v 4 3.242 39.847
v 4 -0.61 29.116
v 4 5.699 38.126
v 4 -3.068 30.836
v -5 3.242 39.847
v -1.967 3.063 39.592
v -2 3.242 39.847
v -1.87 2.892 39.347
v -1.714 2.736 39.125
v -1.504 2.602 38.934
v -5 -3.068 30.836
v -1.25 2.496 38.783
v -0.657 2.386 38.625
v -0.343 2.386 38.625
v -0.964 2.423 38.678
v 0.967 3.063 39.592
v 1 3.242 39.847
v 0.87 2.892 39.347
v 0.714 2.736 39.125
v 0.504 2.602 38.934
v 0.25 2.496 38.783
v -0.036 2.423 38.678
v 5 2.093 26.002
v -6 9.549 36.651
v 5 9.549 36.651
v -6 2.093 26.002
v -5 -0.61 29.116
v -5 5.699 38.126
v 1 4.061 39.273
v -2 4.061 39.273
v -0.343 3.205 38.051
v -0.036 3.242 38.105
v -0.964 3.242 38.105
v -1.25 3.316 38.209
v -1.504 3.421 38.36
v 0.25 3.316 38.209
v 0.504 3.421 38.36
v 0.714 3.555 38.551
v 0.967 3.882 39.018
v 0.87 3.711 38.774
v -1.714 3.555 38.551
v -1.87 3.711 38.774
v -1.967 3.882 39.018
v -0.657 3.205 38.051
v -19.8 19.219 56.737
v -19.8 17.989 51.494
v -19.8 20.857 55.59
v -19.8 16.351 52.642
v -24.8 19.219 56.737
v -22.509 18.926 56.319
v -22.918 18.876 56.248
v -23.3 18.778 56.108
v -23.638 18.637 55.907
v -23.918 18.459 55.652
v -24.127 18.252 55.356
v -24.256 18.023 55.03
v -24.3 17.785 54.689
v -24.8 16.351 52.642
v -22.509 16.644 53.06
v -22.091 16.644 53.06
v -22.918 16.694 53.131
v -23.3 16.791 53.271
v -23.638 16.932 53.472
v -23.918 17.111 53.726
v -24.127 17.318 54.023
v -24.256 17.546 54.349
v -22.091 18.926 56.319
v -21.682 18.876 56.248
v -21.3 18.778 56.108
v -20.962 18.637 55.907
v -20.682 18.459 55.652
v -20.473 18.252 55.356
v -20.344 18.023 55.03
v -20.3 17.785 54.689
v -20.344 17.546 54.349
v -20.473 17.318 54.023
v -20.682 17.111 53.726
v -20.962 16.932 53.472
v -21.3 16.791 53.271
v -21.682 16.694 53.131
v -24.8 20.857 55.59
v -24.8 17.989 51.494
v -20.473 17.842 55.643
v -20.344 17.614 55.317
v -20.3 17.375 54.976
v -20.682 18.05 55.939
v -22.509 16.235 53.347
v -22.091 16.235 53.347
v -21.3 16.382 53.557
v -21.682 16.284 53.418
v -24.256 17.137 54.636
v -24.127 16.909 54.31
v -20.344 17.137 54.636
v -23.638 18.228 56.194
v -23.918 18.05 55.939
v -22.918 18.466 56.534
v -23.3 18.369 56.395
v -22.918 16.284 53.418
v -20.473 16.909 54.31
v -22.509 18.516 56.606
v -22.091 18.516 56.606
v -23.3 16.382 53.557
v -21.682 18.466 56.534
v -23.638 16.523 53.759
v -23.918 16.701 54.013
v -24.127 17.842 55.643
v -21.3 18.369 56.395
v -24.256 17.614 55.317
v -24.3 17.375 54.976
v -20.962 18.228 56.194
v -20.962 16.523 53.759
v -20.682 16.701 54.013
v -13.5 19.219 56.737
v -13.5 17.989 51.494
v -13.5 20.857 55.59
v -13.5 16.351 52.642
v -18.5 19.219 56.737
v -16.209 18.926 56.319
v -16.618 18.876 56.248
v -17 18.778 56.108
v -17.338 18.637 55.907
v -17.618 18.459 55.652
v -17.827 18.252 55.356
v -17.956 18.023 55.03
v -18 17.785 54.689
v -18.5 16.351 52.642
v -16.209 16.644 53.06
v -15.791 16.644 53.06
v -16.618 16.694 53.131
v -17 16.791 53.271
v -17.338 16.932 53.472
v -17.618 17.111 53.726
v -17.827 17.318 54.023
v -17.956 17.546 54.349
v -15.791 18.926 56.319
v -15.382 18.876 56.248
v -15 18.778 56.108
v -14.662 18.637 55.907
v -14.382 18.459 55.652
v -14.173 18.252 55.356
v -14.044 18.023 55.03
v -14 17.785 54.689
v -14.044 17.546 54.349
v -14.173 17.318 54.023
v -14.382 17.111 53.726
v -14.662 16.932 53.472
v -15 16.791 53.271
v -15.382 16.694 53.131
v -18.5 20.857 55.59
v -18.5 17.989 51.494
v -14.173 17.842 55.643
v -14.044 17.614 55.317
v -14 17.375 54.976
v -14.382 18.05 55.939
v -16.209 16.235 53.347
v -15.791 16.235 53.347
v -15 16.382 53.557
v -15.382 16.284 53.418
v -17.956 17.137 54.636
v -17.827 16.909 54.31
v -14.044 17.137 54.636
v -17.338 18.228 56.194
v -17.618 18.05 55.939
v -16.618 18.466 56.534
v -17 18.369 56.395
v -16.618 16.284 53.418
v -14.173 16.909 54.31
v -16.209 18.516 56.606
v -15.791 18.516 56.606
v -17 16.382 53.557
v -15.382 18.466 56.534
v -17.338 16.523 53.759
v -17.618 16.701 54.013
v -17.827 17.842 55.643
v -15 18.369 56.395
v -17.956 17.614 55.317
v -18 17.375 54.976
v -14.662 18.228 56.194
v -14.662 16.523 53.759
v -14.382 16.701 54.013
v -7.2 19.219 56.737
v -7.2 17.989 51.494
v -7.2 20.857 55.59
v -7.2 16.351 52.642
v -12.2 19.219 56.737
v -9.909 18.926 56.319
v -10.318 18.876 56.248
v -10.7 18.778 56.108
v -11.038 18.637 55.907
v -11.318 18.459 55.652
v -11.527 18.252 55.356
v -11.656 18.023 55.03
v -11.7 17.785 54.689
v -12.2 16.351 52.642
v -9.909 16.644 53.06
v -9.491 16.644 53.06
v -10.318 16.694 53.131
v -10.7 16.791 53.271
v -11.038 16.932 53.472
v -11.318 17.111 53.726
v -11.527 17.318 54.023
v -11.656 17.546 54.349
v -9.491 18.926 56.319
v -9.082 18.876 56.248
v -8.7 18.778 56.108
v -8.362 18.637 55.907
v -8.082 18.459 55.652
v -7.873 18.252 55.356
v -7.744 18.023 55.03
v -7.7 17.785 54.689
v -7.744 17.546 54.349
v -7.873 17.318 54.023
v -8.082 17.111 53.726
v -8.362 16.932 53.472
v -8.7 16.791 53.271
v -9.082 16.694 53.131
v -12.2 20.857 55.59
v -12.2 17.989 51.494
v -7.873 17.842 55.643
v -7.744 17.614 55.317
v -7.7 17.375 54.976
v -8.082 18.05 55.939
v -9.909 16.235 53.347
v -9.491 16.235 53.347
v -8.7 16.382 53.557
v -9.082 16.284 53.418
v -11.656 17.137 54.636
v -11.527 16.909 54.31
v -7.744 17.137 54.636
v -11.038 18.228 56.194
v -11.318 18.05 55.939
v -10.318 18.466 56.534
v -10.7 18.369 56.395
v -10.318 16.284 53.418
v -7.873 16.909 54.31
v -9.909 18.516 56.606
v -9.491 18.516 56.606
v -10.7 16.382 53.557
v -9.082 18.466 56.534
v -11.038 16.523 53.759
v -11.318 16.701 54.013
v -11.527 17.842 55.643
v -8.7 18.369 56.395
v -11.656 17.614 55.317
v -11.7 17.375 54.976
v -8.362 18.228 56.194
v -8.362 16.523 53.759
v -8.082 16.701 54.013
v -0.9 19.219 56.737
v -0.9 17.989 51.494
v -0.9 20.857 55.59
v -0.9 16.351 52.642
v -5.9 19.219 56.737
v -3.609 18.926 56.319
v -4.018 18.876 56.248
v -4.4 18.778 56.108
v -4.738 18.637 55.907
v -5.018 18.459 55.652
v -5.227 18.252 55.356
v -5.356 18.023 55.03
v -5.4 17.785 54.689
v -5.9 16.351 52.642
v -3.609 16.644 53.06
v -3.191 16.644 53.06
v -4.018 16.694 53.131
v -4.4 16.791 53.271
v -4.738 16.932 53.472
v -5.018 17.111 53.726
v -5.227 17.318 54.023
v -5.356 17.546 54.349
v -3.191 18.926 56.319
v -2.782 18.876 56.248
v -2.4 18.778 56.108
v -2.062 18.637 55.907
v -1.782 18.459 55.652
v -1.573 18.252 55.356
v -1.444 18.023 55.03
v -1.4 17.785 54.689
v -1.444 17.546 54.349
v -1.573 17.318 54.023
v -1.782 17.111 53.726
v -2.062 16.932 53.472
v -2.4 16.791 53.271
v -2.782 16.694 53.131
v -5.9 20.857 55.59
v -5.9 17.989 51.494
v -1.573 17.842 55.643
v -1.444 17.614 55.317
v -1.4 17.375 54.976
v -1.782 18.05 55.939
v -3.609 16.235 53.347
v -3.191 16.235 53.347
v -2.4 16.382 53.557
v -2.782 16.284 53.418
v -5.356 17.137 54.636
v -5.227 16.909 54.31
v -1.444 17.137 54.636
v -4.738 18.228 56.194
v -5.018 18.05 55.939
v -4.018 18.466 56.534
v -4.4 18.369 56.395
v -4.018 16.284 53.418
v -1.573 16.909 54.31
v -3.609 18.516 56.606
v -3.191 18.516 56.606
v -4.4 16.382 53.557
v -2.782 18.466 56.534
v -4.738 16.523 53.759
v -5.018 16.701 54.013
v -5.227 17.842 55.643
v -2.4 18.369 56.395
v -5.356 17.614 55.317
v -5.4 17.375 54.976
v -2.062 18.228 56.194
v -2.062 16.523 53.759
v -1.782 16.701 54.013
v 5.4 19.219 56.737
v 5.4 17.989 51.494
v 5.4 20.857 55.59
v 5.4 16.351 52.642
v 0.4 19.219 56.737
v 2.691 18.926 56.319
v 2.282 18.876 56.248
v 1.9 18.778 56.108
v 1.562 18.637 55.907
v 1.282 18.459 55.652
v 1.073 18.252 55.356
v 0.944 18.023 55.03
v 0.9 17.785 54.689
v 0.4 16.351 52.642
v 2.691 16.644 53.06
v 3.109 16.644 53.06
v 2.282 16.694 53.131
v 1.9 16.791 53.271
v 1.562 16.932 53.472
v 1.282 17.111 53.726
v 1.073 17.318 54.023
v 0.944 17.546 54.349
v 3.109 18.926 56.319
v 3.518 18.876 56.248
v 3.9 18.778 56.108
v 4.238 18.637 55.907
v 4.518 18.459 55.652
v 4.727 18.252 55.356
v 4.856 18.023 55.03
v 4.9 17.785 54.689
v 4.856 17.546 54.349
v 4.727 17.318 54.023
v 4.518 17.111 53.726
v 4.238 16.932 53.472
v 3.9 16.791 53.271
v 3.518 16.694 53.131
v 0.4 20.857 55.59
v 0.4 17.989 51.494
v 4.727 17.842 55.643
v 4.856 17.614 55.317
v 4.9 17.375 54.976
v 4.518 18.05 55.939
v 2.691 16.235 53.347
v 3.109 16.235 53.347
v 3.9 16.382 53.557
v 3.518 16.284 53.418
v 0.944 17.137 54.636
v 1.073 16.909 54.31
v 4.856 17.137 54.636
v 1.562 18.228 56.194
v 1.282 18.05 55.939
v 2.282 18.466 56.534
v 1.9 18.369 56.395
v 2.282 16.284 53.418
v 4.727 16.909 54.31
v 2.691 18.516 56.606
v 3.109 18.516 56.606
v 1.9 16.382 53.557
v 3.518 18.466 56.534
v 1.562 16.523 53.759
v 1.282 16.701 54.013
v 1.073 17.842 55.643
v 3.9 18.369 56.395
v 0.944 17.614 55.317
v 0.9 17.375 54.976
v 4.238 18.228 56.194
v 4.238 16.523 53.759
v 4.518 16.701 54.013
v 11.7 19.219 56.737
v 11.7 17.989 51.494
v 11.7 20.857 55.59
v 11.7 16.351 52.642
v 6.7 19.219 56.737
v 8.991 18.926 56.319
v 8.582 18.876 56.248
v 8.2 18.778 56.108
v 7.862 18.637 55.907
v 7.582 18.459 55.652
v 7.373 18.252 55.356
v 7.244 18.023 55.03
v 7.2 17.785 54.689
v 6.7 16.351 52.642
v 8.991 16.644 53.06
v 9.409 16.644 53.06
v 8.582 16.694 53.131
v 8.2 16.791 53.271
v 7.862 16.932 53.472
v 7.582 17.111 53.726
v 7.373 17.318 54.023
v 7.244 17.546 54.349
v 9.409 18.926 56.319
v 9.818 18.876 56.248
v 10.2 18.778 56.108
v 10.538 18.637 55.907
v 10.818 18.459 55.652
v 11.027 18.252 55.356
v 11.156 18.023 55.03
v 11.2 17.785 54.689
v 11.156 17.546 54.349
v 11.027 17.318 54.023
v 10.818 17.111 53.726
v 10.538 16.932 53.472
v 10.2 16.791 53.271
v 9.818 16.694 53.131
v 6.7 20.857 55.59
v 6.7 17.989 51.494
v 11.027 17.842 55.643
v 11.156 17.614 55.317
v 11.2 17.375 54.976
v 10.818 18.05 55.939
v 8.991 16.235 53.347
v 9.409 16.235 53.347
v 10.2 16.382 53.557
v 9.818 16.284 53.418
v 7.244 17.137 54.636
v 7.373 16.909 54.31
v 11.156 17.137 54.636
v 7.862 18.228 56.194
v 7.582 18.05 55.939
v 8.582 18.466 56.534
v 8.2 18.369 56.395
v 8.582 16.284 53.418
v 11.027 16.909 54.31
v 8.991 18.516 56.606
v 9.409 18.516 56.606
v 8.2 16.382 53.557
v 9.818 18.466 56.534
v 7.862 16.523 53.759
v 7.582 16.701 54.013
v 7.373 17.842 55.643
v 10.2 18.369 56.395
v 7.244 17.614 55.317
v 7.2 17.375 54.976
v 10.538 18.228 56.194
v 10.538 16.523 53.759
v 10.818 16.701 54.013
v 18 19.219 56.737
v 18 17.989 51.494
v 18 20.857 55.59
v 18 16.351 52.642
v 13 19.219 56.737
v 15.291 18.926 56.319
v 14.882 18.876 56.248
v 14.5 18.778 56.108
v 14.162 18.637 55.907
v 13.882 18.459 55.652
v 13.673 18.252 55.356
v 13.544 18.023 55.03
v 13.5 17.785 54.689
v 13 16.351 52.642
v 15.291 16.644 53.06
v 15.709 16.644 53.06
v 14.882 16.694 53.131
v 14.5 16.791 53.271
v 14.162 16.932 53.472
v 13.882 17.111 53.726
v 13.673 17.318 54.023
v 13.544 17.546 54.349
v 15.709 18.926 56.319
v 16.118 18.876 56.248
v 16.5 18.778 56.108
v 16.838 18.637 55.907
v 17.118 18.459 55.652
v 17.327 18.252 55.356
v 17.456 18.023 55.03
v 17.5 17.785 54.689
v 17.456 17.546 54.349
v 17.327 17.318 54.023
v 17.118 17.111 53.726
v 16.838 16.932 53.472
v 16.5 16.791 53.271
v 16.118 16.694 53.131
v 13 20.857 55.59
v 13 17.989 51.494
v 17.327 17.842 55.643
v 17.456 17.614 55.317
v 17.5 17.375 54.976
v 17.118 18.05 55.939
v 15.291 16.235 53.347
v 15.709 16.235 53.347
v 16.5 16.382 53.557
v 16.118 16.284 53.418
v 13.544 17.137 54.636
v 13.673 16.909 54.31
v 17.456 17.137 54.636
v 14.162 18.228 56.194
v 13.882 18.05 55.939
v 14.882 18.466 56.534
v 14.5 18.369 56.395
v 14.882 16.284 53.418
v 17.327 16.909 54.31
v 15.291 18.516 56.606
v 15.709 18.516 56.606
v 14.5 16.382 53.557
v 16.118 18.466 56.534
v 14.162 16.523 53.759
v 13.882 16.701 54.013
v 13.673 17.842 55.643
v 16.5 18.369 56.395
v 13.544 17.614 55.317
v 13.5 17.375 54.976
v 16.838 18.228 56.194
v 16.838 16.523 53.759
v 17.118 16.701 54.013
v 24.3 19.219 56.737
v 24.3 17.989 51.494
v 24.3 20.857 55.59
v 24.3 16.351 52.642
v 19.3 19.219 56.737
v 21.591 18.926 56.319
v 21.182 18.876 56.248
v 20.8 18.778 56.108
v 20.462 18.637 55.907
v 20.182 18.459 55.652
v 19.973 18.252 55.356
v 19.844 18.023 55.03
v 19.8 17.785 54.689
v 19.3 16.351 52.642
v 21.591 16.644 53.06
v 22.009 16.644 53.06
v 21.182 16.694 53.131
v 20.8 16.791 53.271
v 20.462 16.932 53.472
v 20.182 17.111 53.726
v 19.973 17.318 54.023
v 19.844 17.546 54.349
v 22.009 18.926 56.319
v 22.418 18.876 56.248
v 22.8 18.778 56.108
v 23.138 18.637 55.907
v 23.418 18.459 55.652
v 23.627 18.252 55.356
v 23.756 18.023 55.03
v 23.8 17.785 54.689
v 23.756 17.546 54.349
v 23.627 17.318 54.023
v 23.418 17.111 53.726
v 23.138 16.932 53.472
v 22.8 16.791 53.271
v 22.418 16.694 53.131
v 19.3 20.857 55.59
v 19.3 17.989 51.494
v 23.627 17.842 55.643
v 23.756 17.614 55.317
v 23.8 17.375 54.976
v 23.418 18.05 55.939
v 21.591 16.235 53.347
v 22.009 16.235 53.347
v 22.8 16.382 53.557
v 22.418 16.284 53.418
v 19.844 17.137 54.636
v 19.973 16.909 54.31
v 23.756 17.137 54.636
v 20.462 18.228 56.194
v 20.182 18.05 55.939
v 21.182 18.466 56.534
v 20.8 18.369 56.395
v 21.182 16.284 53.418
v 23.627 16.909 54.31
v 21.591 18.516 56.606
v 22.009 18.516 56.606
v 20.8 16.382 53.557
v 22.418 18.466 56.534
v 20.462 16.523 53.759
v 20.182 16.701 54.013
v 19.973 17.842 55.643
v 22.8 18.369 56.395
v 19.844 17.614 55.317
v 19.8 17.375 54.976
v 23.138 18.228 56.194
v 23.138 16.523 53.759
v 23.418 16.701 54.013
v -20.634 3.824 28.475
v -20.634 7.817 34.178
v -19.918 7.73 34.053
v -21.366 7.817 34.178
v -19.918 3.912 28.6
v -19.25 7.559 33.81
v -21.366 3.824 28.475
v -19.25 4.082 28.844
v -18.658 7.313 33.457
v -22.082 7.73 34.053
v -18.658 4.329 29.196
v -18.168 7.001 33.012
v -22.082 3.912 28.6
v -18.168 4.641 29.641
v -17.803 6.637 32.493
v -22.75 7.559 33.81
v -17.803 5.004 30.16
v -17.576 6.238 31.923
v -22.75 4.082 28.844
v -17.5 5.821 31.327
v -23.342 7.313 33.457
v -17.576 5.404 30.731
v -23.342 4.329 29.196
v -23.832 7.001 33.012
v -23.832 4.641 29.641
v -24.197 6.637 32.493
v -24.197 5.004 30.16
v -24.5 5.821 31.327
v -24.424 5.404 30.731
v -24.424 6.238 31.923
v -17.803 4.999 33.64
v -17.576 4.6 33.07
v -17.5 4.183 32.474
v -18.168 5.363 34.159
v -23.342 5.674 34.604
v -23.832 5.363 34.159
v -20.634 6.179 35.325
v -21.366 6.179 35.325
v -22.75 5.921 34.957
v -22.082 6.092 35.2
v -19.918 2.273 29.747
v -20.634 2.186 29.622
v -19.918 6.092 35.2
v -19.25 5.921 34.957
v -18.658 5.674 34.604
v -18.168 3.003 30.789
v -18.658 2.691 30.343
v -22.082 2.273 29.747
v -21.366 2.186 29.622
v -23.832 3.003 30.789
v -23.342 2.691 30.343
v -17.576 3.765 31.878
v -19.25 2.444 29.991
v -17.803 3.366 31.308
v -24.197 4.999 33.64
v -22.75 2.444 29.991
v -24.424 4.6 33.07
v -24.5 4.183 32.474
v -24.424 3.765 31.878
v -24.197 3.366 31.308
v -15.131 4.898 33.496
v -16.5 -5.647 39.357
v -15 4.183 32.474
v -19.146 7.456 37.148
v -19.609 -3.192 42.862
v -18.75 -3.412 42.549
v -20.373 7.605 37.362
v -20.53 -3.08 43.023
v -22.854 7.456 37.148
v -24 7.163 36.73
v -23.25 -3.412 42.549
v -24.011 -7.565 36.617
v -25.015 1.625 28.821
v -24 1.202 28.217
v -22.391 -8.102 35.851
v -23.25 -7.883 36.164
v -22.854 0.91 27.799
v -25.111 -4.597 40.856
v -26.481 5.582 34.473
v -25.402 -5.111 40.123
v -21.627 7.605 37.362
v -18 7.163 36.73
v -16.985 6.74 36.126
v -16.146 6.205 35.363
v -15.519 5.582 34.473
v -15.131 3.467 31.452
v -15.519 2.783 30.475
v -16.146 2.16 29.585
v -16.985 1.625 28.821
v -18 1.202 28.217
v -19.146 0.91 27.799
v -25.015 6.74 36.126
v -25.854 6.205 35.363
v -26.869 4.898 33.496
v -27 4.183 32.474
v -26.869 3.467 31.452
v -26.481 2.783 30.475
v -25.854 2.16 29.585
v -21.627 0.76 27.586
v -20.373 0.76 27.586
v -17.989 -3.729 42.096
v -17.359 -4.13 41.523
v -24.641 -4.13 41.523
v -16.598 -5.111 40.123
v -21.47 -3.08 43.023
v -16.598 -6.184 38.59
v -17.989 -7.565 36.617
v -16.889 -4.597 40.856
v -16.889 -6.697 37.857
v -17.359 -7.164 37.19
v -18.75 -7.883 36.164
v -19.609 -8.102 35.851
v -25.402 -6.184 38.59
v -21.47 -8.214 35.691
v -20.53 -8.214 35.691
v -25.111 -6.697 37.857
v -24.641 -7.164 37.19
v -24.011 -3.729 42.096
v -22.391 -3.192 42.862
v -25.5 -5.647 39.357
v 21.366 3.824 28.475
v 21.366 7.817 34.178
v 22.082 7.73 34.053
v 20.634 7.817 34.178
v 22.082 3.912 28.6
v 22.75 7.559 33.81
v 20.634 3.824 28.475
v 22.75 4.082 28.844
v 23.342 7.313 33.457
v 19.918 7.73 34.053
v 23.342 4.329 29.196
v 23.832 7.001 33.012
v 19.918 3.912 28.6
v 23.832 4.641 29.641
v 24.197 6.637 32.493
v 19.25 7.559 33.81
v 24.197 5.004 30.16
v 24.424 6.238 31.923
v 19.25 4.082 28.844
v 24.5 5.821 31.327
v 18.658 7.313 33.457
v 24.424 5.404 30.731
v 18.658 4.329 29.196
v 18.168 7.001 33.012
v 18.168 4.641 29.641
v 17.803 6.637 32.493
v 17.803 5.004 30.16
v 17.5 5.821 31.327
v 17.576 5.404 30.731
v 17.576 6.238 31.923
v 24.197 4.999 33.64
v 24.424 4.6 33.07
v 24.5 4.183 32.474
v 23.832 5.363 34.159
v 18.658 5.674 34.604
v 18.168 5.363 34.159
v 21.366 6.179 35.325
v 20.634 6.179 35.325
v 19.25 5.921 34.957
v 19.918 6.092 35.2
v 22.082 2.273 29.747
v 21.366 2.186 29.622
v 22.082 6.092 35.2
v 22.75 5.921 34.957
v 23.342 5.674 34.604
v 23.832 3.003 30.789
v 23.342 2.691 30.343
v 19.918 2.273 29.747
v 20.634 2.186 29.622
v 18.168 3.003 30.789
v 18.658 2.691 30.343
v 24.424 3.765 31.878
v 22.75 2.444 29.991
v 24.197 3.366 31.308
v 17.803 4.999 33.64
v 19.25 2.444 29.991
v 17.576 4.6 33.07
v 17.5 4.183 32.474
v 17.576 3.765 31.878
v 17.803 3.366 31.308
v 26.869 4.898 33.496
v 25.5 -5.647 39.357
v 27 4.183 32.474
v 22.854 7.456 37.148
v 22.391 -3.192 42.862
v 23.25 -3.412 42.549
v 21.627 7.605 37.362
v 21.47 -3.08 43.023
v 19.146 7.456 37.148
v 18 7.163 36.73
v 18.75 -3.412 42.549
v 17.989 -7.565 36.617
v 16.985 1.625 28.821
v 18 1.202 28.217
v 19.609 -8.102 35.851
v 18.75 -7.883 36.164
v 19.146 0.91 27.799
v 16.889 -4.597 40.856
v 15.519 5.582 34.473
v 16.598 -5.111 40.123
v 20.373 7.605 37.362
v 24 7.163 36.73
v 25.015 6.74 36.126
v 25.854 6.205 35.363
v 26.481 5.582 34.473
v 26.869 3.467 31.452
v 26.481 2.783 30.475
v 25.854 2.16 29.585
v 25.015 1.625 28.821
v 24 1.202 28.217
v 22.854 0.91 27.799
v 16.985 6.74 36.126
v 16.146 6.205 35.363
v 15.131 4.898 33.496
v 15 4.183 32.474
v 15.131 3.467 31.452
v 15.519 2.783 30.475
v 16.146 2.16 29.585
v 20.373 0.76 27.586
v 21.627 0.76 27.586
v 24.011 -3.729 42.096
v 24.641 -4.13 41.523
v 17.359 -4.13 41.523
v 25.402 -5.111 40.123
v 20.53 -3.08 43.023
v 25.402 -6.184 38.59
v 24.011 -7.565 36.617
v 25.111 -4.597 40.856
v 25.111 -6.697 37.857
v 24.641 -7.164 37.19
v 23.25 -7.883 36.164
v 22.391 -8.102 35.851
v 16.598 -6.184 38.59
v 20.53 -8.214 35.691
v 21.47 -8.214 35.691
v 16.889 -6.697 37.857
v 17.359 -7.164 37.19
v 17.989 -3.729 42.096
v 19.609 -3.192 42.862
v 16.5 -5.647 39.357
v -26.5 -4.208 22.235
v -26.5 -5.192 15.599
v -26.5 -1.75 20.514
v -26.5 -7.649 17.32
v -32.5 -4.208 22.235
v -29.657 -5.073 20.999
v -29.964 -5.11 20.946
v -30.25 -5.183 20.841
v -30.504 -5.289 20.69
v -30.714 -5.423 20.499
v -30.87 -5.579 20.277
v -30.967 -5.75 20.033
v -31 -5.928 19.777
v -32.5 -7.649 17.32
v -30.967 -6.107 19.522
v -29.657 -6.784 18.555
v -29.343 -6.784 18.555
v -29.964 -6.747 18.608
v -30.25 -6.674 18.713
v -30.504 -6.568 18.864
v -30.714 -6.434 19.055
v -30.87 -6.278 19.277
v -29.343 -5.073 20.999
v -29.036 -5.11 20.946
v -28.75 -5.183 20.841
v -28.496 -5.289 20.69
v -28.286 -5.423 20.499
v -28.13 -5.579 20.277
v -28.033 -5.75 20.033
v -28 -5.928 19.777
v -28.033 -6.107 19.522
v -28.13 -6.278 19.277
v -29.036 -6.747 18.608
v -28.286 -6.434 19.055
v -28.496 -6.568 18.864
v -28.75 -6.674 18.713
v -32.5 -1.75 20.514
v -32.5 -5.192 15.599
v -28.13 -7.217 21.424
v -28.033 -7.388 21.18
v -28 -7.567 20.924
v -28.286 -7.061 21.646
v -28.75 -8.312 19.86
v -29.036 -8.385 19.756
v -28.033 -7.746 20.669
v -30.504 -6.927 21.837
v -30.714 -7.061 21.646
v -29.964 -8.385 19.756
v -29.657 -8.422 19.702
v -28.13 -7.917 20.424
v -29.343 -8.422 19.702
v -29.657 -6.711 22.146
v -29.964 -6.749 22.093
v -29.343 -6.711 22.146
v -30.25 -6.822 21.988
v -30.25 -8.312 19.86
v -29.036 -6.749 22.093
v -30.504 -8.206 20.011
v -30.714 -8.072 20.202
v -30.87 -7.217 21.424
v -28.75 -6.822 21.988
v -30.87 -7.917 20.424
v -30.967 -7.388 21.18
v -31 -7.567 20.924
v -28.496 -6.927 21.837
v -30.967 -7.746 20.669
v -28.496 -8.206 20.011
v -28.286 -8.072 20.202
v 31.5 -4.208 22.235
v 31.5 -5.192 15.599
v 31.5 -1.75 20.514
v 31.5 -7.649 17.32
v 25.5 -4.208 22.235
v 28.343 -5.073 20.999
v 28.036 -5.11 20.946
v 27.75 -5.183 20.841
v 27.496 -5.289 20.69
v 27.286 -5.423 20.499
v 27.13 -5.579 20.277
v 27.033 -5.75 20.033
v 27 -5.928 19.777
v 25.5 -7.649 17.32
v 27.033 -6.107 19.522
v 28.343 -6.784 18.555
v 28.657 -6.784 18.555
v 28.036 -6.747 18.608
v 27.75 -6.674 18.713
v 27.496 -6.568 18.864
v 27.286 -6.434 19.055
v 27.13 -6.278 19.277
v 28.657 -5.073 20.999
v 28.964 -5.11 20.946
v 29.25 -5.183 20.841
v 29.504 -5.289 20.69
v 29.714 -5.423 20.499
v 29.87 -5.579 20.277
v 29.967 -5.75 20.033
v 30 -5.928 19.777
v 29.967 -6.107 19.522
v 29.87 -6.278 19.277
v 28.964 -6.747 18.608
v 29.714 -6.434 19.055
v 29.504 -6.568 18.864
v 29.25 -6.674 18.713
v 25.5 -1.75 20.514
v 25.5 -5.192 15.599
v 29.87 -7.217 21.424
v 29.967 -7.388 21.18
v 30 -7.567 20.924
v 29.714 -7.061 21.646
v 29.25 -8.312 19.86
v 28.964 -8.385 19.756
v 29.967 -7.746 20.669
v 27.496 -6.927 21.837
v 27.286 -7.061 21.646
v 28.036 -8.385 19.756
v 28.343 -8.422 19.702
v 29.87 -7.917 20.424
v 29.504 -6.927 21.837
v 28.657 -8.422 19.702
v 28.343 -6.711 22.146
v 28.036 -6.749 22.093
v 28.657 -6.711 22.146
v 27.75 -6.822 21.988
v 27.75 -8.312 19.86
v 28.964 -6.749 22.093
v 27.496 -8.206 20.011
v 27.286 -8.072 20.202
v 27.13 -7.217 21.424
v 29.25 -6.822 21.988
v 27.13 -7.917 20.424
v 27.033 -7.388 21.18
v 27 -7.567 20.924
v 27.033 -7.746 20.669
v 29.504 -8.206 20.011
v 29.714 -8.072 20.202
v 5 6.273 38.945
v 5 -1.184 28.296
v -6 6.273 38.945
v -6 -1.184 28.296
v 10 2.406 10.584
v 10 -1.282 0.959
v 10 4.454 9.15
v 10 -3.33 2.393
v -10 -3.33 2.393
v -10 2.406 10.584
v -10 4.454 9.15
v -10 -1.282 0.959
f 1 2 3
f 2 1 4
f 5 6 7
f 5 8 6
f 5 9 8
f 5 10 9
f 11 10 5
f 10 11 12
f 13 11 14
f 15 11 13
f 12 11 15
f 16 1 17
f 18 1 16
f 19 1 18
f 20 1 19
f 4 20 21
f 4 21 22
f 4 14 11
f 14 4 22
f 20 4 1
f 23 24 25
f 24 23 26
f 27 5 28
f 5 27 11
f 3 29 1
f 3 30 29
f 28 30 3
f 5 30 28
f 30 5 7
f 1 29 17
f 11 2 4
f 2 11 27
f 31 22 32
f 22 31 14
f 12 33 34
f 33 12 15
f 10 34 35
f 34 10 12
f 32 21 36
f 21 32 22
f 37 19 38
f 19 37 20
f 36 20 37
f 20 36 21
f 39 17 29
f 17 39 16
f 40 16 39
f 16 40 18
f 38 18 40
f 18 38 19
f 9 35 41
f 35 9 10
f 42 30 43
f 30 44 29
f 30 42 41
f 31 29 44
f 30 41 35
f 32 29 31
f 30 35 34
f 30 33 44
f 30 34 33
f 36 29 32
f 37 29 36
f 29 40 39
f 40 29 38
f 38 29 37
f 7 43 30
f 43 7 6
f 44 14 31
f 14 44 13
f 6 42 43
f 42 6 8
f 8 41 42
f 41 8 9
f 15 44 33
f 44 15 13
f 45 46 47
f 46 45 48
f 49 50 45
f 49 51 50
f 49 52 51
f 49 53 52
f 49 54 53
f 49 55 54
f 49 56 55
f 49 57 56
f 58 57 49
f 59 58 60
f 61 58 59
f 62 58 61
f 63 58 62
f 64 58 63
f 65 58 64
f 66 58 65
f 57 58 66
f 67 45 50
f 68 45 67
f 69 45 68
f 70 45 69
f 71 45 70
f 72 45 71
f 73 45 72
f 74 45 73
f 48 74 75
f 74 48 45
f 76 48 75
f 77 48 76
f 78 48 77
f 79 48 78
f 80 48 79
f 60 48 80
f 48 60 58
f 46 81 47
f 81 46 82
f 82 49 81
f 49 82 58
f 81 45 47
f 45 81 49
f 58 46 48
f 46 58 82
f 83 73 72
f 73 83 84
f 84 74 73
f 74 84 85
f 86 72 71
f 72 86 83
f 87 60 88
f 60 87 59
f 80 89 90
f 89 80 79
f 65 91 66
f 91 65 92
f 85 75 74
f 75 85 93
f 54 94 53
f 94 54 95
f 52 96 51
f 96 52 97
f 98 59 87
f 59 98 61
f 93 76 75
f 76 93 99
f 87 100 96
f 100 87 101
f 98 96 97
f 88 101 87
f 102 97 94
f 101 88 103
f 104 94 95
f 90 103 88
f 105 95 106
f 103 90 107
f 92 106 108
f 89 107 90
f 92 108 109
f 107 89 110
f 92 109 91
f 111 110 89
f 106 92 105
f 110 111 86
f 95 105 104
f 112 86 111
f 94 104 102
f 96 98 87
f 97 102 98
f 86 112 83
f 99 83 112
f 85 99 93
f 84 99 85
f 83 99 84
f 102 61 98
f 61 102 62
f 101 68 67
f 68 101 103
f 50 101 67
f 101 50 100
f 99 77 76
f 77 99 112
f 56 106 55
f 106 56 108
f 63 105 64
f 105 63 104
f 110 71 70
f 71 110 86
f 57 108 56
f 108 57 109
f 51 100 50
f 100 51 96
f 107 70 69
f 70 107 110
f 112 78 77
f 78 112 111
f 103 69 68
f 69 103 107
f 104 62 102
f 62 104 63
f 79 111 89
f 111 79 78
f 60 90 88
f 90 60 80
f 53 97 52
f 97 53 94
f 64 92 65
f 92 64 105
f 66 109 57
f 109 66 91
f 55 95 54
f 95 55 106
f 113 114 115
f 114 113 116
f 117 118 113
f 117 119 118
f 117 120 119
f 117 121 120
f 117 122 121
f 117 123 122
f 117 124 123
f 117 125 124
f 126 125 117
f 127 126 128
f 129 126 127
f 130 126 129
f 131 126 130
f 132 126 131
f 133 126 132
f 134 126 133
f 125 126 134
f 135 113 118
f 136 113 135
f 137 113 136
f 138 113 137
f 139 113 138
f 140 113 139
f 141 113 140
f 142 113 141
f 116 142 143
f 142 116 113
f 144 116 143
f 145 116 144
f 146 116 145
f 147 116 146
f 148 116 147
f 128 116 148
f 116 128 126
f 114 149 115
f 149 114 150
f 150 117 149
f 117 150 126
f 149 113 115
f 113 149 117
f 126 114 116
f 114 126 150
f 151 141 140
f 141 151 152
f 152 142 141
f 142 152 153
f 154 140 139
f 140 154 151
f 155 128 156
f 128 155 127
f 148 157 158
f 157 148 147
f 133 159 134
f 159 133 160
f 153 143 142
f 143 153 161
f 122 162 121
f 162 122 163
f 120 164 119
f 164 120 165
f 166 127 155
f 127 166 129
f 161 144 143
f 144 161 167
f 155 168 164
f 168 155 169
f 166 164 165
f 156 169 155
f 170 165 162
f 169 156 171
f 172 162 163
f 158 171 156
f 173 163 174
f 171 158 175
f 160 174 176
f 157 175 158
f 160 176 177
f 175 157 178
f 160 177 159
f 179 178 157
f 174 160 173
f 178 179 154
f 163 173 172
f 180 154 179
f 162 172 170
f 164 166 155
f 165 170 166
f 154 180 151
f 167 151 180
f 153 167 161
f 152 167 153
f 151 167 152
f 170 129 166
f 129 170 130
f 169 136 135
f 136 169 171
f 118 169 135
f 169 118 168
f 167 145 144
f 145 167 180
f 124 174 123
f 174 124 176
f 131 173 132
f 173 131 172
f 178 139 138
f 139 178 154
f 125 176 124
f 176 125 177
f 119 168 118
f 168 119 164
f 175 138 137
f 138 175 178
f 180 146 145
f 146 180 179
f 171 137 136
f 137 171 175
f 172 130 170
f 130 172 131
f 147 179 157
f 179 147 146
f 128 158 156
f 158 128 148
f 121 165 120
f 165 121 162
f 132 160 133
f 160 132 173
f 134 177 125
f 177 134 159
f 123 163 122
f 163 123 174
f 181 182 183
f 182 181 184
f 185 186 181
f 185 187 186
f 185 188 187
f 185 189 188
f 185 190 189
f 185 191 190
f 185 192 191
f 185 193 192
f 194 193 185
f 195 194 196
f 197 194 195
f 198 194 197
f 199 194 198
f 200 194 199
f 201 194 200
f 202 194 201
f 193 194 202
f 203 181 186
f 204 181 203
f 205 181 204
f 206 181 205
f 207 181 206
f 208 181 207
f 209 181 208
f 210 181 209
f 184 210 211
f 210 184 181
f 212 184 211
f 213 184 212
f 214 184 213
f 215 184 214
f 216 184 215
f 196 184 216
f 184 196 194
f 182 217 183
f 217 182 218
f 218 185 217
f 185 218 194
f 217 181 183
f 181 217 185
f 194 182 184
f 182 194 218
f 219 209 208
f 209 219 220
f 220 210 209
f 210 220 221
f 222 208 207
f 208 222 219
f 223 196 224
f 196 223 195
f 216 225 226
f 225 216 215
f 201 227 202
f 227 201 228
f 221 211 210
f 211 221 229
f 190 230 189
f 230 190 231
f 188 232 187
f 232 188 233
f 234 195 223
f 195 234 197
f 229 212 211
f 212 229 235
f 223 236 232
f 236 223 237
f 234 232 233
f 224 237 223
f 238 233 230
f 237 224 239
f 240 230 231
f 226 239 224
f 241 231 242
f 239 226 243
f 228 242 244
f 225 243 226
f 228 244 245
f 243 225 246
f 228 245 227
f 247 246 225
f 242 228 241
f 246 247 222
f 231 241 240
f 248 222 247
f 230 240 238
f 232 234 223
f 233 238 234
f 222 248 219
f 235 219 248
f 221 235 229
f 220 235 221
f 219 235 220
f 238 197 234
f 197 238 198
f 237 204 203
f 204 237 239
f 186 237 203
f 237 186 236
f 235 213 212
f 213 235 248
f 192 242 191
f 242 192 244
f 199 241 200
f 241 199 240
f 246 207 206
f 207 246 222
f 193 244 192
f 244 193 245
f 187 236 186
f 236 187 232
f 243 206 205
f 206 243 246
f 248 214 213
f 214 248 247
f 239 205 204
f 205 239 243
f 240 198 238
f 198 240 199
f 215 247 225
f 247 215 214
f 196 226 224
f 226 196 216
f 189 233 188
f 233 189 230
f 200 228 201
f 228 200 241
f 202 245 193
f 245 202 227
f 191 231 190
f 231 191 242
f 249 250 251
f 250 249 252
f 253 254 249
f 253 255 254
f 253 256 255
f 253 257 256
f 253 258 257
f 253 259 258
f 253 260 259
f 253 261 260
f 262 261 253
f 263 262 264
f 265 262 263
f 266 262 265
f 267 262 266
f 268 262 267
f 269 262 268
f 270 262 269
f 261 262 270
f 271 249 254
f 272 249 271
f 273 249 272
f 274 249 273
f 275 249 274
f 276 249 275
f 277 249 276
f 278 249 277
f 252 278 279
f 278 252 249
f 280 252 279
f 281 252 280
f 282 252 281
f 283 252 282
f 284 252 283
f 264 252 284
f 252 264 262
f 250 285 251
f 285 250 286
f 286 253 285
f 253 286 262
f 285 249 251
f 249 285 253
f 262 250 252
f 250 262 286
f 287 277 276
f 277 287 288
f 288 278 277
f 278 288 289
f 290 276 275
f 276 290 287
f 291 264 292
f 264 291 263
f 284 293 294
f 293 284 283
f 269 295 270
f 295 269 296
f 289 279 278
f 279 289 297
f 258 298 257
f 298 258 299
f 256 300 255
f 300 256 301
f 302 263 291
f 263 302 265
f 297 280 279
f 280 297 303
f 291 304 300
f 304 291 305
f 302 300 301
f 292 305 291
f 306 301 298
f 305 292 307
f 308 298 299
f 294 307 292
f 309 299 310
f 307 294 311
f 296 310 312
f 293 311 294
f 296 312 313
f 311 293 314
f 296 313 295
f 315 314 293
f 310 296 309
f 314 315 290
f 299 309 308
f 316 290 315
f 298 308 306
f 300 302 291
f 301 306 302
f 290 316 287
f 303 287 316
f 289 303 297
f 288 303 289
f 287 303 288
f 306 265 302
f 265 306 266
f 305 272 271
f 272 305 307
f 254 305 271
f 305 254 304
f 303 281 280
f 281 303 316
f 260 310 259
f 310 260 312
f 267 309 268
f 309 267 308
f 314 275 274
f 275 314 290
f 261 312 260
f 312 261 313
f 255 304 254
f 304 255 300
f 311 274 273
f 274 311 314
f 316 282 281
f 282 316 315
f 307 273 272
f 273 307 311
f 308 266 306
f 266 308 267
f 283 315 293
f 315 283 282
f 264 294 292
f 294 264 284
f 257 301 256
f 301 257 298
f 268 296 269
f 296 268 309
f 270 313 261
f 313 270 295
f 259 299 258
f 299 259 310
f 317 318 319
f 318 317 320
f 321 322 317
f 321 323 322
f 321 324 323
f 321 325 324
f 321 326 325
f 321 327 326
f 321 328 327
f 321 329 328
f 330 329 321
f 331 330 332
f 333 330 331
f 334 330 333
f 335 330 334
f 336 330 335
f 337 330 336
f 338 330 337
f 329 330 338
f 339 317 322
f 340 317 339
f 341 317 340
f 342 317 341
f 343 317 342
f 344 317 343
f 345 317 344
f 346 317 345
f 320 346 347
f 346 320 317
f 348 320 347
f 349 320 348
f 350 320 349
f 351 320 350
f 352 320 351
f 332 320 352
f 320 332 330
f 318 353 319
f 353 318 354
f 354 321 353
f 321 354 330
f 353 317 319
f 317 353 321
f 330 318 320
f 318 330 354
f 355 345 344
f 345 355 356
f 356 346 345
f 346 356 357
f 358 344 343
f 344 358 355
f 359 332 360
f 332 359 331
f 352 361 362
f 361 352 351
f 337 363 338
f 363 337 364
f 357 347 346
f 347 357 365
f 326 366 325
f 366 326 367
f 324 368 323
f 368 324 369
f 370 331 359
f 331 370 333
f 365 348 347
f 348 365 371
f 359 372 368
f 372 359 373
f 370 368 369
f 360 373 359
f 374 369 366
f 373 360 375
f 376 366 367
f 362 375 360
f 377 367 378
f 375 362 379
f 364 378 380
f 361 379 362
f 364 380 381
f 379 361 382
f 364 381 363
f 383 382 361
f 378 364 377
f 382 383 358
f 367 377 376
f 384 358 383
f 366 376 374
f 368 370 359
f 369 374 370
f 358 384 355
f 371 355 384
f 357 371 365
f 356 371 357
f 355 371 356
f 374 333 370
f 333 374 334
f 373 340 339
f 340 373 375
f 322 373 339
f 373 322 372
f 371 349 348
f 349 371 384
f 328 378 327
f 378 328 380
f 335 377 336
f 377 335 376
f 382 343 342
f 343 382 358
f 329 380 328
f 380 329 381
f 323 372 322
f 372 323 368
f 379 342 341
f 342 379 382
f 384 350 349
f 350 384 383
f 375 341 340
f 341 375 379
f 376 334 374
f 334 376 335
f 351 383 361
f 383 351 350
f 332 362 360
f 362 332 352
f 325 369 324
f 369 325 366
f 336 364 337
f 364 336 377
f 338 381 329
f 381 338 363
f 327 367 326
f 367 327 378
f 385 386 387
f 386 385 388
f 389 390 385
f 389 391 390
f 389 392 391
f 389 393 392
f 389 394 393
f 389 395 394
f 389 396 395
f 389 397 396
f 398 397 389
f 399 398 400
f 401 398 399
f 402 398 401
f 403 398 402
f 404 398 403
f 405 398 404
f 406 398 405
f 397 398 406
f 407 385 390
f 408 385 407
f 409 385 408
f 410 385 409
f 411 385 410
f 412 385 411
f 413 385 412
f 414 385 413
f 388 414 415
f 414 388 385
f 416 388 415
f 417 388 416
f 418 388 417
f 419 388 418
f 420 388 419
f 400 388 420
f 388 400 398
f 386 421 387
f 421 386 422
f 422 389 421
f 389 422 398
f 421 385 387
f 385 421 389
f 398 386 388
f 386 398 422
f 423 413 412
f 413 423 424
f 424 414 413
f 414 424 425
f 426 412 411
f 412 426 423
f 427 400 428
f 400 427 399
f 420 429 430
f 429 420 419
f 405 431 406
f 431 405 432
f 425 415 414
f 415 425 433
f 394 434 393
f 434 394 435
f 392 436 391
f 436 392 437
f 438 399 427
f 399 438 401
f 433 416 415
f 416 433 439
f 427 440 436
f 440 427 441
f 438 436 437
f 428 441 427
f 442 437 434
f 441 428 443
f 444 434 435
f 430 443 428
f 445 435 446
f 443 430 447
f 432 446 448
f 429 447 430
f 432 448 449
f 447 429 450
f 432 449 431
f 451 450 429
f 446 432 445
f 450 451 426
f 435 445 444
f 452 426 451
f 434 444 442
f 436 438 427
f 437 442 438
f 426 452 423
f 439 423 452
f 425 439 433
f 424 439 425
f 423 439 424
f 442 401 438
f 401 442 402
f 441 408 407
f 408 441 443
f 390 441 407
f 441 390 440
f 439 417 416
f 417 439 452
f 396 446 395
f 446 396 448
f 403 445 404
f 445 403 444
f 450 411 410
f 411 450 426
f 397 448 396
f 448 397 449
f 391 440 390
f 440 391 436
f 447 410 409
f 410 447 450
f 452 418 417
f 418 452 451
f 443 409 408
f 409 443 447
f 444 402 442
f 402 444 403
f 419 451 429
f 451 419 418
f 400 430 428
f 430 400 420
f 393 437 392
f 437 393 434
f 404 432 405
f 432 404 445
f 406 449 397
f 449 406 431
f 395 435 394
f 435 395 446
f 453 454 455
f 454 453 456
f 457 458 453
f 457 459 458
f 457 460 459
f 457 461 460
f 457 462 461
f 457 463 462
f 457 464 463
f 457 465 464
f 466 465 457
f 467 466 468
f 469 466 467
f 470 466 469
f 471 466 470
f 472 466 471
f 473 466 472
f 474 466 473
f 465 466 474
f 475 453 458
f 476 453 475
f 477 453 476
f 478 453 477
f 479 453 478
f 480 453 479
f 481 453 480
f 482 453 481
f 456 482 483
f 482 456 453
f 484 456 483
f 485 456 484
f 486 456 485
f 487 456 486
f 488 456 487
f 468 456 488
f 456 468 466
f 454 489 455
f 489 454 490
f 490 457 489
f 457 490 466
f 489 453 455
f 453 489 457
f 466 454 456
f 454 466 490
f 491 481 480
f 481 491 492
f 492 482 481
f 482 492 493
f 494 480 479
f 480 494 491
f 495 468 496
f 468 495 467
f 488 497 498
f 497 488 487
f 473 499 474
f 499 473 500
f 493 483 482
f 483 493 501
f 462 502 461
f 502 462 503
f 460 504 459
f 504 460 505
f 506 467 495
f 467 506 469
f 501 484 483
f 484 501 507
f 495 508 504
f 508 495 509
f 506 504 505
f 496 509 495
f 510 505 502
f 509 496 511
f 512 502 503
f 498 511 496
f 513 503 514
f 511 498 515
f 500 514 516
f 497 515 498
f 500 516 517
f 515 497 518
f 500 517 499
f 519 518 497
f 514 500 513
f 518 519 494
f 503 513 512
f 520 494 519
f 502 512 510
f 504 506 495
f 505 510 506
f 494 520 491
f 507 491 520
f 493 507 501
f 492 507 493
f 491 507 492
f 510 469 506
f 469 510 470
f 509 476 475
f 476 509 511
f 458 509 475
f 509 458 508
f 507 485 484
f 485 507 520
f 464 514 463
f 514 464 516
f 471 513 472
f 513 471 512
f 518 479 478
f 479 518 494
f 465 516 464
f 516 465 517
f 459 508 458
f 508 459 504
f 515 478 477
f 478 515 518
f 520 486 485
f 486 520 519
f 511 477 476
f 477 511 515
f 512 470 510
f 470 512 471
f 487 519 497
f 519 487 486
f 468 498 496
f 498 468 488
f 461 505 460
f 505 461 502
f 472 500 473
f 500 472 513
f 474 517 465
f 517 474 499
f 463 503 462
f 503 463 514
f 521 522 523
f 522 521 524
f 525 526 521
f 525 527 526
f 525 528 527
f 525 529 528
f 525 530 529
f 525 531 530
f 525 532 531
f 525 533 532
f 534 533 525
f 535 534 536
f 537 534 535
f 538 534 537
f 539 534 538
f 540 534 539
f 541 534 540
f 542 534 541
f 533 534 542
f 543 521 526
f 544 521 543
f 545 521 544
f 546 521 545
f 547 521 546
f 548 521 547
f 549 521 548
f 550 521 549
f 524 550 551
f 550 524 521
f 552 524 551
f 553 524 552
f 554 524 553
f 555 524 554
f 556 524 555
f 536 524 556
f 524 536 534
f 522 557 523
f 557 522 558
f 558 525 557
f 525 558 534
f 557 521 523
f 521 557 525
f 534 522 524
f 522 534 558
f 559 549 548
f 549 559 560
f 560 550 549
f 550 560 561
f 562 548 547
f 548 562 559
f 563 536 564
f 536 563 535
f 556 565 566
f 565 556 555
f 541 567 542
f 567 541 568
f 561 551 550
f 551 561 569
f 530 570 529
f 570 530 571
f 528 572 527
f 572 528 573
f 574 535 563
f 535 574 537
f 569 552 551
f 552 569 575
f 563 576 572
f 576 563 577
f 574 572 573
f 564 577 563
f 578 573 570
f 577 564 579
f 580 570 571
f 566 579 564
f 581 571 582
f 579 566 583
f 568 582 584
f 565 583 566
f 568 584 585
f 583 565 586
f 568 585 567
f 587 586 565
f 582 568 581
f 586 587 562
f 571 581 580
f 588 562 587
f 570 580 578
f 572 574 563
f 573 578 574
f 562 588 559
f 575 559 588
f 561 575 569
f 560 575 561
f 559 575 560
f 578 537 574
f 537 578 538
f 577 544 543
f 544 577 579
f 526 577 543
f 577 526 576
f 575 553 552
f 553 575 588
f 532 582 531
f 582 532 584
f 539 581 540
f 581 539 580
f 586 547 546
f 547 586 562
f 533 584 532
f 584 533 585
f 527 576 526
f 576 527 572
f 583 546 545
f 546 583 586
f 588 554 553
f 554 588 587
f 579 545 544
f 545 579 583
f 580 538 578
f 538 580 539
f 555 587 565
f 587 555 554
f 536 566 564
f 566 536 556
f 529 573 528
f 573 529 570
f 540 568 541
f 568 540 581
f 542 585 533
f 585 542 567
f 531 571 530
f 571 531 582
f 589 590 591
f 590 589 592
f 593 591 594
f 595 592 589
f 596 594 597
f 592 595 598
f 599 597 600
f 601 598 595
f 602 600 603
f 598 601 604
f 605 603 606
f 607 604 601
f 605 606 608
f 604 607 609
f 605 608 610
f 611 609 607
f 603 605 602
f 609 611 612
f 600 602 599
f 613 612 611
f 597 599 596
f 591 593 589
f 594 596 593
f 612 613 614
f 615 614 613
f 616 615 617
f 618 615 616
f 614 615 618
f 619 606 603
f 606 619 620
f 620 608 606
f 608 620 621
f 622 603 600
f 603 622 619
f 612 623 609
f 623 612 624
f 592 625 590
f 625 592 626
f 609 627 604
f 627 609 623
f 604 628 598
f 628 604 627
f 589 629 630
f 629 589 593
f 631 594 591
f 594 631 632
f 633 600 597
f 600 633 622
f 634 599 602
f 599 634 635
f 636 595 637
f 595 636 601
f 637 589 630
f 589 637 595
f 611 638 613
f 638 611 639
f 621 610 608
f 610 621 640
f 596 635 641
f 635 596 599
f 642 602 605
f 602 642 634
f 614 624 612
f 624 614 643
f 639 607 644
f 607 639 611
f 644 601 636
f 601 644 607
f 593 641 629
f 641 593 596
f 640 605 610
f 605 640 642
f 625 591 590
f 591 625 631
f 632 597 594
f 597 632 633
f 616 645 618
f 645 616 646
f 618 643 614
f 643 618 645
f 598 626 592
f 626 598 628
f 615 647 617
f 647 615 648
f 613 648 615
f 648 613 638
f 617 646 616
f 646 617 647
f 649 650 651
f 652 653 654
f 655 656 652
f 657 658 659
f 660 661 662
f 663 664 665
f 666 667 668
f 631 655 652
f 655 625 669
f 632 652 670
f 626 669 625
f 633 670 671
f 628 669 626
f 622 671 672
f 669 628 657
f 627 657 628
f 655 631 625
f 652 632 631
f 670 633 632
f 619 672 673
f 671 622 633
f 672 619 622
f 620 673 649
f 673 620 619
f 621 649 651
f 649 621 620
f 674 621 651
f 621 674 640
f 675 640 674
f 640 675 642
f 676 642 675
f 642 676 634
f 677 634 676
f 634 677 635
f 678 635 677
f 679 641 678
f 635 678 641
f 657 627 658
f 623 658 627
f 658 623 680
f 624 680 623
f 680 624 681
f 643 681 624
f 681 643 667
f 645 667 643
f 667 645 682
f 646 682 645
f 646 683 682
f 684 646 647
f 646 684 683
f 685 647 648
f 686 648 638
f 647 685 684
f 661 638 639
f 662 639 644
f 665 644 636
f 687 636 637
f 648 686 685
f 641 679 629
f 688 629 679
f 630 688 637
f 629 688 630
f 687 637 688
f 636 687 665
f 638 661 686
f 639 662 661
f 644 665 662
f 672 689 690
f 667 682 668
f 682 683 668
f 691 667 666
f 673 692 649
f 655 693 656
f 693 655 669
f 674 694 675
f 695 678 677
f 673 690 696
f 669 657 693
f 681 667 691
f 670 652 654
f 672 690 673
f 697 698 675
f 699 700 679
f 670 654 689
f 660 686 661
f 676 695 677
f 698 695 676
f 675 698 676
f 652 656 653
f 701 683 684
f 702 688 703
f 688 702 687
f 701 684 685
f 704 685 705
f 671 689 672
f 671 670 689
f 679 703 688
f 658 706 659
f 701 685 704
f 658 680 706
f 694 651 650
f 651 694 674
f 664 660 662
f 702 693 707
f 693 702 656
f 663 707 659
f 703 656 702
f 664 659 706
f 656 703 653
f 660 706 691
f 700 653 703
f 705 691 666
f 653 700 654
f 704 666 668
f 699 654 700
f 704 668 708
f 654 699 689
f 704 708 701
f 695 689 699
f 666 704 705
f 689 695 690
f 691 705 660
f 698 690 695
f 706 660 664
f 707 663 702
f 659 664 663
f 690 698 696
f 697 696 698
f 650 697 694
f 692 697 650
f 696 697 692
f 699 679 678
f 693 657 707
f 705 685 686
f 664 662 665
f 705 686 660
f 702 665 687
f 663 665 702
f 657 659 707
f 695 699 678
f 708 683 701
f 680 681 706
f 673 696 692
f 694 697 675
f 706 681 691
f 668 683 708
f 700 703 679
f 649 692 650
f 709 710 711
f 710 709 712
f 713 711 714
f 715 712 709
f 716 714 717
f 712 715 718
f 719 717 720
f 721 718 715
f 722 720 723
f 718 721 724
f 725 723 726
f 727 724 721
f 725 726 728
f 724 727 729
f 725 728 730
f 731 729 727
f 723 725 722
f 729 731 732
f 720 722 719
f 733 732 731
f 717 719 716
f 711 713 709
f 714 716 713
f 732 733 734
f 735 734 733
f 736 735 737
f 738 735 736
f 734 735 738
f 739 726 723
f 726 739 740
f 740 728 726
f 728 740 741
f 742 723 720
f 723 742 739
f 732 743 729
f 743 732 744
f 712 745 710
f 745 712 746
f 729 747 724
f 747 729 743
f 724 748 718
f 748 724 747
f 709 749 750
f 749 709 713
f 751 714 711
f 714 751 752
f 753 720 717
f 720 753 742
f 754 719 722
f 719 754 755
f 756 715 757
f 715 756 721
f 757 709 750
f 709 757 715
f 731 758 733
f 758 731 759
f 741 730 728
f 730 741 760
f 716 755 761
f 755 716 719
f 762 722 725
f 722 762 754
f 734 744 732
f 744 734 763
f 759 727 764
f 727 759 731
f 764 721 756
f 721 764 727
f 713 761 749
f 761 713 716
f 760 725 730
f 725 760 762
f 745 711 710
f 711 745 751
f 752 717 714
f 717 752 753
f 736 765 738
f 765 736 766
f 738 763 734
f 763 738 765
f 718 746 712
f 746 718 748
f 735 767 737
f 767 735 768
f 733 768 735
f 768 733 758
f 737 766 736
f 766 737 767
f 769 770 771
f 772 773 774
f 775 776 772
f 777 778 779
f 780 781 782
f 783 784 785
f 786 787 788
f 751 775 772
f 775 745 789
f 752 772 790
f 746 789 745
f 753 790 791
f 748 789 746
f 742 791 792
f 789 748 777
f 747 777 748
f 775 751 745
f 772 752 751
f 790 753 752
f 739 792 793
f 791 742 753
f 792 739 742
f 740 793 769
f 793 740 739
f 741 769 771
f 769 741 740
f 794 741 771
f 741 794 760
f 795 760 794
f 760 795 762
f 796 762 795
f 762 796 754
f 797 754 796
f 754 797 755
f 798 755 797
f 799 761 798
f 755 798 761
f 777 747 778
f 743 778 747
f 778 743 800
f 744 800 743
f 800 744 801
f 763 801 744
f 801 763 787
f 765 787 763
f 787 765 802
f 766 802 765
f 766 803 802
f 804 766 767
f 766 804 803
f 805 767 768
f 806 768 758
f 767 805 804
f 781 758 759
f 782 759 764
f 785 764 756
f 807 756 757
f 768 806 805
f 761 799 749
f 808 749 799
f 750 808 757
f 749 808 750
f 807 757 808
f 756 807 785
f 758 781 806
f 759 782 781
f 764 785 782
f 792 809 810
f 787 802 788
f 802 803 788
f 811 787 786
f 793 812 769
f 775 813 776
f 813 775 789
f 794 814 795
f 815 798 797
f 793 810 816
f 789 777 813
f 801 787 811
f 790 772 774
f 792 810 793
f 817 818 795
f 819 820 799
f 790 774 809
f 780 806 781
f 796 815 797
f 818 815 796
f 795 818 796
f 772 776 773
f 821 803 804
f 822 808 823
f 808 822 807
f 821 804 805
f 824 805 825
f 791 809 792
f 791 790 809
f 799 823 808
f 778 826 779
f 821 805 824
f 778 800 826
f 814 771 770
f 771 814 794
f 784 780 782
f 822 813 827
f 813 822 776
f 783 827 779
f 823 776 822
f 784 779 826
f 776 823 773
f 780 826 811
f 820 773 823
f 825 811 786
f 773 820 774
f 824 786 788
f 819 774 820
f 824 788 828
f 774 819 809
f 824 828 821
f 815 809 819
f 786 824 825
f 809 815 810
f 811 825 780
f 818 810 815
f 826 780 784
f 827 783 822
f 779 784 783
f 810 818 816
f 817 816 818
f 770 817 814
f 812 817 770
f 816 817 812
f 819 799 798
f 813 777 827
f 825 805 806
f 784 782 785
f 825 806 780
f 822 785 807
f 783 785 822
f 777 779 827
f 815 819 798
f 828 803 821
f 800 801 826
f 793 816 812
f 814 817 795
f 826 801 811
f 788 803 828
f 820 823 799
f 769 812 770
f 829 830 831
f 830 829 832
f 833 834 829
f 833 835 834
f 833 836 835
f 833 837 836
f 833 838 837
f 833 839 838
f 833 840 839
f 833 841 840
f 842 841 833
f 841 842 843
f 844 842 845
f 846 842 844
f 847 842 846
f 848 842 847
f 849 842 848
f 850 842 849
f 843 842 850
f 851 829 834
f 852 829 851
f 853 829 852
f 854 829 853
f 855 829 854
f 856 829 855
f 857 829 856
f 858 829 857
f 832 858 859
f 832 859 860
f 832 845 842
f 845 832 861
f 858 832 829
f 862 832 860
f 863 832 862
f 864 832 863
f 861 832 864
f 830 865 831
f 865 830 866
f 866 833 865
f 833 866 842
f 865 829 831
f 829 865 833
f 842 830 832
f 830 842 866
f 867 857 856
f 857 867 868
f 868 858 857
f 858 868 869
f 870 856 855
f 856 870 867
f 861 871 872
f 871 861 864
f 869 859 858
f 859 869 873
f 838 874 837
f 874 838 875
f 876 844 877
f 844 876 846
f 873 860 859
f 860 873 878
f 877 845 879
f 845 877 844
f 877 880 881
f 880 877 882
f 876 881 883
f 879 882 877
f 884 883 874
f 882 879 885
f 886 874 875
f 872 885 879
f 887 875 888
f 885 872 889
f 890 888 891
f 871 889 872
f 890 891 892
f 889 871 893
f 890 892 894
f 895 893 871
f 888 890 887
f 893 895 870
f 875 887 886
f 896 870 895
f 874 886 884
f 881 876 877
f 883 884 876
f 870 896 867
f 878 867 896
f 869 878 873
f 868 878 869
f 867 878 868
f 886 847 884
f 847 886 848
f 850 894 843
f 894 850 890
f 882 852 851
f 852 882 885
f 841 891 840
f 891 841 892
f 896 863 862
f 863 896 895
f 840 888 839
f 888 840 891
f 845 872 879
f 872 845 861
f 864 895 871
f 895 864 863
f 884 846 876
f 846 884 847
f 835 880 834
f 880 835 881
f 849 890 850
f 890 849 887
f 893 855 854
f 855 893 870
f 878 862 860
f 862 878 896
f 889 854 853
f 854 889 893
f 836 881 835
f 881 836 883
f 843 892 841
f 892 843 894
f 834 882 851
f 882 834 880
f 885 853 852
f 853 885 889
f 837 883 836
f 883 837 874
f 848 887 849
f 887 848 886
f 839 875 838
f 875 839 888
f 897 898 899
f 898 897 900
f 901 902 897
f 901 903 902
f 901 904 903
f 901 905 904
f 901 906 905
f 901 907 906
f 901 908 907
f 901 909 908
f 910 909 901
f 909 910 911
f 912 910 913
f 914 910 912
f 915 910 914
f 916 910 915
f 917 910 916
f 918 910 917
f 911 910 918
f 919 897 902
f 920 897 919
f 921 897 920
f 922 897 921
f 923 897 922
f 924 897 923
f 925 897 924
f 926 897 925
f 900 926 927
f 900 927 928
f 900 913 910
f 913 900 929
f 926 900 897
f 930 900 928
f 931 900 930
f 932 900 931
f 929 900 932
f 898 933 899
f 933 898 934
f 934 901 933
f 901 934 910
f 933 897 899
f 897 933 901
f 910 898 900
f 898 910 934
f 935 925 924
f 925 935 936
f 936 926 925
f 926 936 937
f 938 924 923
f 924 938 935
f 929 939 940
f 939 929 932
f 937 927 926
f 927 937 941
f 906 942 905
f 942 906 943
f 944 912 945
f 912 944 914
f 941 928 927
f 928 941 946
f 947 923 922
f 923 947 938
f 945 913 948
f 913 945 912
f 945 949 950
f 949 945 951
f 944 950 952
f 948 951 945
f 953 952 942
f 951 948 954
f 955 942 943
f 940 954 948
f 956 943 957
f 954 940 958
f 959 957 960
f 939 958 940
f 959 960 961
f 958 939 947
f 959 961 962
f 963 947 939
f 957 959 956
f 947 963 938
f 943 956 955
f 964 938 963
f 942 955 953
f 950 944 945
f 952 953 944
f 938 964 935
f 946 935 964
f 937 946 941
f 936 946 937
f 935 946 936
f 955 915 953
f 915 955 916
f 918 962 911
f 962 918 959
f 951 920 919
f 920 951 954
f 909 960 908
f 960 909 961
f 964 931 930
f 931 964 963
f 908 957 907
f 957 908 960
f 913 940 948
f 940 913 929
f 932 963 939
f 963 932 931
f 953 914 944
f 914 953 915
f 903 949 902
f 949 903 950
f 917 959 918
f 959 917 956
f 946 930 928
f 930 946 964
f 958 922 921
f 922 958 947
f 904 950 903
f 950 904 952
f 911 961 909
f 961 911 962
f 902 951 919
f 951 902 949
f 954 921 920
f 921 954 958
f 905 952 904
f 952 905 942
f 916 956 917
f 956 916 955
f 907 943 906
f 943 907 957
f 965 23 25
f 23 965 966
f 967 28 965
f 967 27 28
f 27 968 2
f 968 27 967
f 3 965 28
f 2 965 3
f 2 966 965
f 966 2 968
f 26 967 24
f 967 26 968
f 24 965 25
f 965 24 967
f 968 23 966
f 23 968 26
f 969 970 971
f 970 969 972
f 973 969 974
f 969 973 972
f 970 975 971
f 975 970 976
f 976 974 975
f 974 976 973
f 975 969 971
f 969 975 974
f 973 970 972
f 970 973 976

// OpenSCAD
    // MixTape 3d Printed Case///////////////////////////

plugHeight = 9.8; // [6:10]
tapeHeight = 10.0; //
topThickness = 1.6; 

usb_charger = false;
cutout_aux_ports = true;

rotate([55,0,$t*380]) translate([-50,0,0]){

PCB();
parts();

difference(){
    
    FullCase();
    
    // Plugs 
    translate([2.5,50,tapeHeight-plugHeight+topThickness]) cube([13,20,plugHeight+1],false); 
    translate([83.5,50,tapeHeight-plugHeight+topThickness]) cube([13,20,plugHeight+1],false);
    
    // write protectors 
    translate([10,0,0.5*tapeHeight+1.6]) cube([4,1,4],true);
    translate([14,0,0.5*tapeHeight+1.6]) cube([4,3,4],true);
    translate([89,0,0.5*tapeHeight+1.6]) cube([4,1,4],true);
    translate([85,0,0.5*tapeHeight+1.6]) cube([4,3,4],true);

    // Power signs
    if (!usb_charger) {
        translate([41,0,0.5*tapeHeight+1.6]) cube([4,1.5,1],true);
        translate([41,0,0.5*tapeHeight+1.6]) cube([1,1.5,4],true);
    
        translate([58,0,0.5*tapeHeight+1.6]) cube([4,1.5,1],true); 
    }
}
}

module FullCase(){
    tapeBody();
    tapeTop();
}


// Modules ///////////////////////////////

module PCB(){
 color("DarkKhaki") 
    translate ([0,0,tapeHeight+1.6]) linear_extrude(height = 1.6, center = false, convexity = 10, twist = 0) import("mixtape_case_3D_bottom.dxf", convexity=3);
 color("Gold") 
     translate ([0,0,tapeHeight+3.2]) linear_extrude(height = 0.2, center = false, convexity = 10, twist = 0) import("mixtape_case_3D_PCB.dxf", convexity=3);
    
 color("DarkKhaki") 
    translate ([0,0,tapeHeight+2*topThickness]) linear_extrude(height = 1.6, center = false, convexity = 10, twist = 0) import("mixtape_case_3D_PCB_TrapezBoard.dxf", convexity=3);
 color("Gold") 
     translate ([0,0,tapeHeight+3*topThickness]) linear_extrude(height = 0.2, center = false, convexity = 10, twist = 0) import("mixtape_case_3D_PCB_TrapezCircuit.dxf", convexity=3);
}

module tapeBody(){ 
  difference(){ 
    //color("Deeppink") 
    translate ([0,0,1.6]) linear_extrude(height = tapeHeight, center = false, convexity = 10, twist = 0) import("mixtape_case_3D_bottom.dxf", convexity=3);  
    
     if (!usb_charger) {
        translate ([0,0,0.6]) linear_extrude(height = 12, center = false, convexity = 10, twist = 0) import("mixtape_case_3D_MainCase.dxf", convexity=3);
     } else {
         translate ([0,0,0.6]) linear_extrude(height = 12, center = false, convexity = 10, twist = 0) import("mixtape_case_3D_MainCase_USB.dxf", convexity=3);
     }
    
    //Face holes
    translate([25,64,0.5*tapeHeight+topThickness]) cube([12,4,0.7*tapeHeight],true);
    if (!usb_charger) { translate([49.5,64,0.5*tapeHeight+topThickness]) cube([16,4,0.7*tapeHeight],true); }
    translate([74.3,64,0.5*tapeHeight+topThickness]) cube([12,4,0.7*tapeHeight],true);
      
    translate([36,65,0.5*tapeHeight+topThickness]) cube([4,4,0.6*tapeHeight],true);
    translate([63,65,0.5*tapeHeight+topThickness]) cube([4,4,0.6*tapeHeight],true);
    
    if (usb_charger) {
        // cutout usb port
        translate([49.5,64,0.5*tapeHeight+topThickness+3]) cube([20,14,0.7*tapeHeight+4],true);
    }
    if (cutout_aux_ports) {
        translate([1.5,23,0.5*tapeHeight+topThickness+3]) cube([20,12,0.7*tapeHeight],true);
        translate([90,23,0.5*tapeHeight+topThickness+3]) cube([20,12,0.7*tapeHeight],true);      
    }
     
  }
  
  
  //color("DarkKhaki") 
  if (!usb_charger) {
    translate([40,0.05,1.6]) cube([20,10,2.5],false);
  }
}

module tapeTop(){ 
 
difference(){ 
 color("Deeppink") 
     translate ([0,0,-1.5]) linear_extrude(height = 1.5, center = false, convexity = 10, twist = 0) import("mixtape_case_3D_TopTrapez.dxf", convexity=3);
     
   color("Gold") 
     translate ([0,0,-2.2]) linear_extrude(height = 3, center = false, convexity = 10, twist = 0) import("mixtape_case_3D_Holes.dxf", convexity=3);
   translate([50,53,-2.2]) cylinder(h=1.2, r=1.3, center=false, ,$fn=30);
}   
    

difference(){    
  color("Deeppink") 
     translate ([0,0,0]) linear_extrude(height = 1.6, center = false, convexity = 10, twist = 0) import("mixtape_case_3D_bottom.dxf", convexity=3);

  translate([4,3,-1]) cylinder(h=1.5, r=1.3, center=false, ,$fn=30);
  translate([95,3,-1]) cylinder(h=1.5, r=1.3, center=false, ,$fn=30);
  translate([4,61,-1]) cylinder(h=1.5, r=1.3, center=false, ,$fn=30);
  translate([95,61,-1]) cylinder(h=1.5, r=1.3, center=false, ,$fn=30);
    
  color("Pink") 
     translate ([0,0,-1.3]) linear_extrude(height = 2, center = false, convexity = 10, twist = 0) import("mixtape_case_3D_WindowRect.dxf", convexity=3); 
    
  difference(){    
  color("Gold") 
     translate ([0,0,-0.5]) linear_extrude(height = 1, center = false, convexity = 10, twist = 0) import("mixtape_case_3D_BigRect.dxf", convexity=3);  
  

  translate ([0,0,-3]) linear_extrude(height = 10, center = false, convexity = 10, twist = 0) import("mixtape_case_3D_MidRect.dxf", convexity=3);   
  }
  
  translate ([0,0,-3]) linear_extrude(height = 5.5, center = false, convexity = 10, twist = 0) import("mixtape_case_3D_Wheels.dxf", convexity=3); 
}

  translate ([0,0,0.4]) linear_extrude(height = 1.2, center = false, convexity = 10, twist = 0) import("mixtape_case_3D_NutWheels.dxf", convexity=3); 

}
 

module parts(){
    // IC-Socket
  color("Grey")
      translate([44,22.5,tapeHeight+2*topThickness]) cube([11,13,4],false);
    
  difference(){
  color("Black")
      translate([45,23.5,tapeHeight+2*topThickness]) cube([9,11,7],false);
        
    translate([49.5,34.5,tapeHeight+2*topThickness+6]) cylinder(h=10, r=1.5, center=false, ,$fn=30);
    }
    
    // NEO-Pixels
    for (a = [ 0 : 6.3 : 46 ])
    translate([a,0,0]) NEOpixel();
    
    module NEOpixel(){
    color("White")
      translate([25.2,52.5,tapeHeight+3*topThickness]) cube([5,5,2],false);
        
    color("Deeppink")
      translate([27.7,55,tapeHeight+3*topThickness]) cylinder(h=2.5, r=2, center=false, ,$fn=30);
    }
    
    // Pots
    potentiometer();
    translate ([42,0,0]) potentiometer();
    
    module potentiometer(){
    color("Grey")
      translate([29,29,tapeHeight+2*topThickness]) cylinder(h=10, r=3.5, center=false, ,$fn=30);
    
    color("Deeppink")
        translate([29,29,tapeHeight+2*topThickness+2]) cylinder(h=12, r1=6, r2=4.5, center=false, ,$fn=30);
    }
    
    // Buttons
    button();
    translate ([58,0,0]) button();
    
    module button(){
    color("Grey")
      translate([17.5,9.8,tapeHeight+2*topThickness]) cube([6,6,3],false);
        
    color("Red")
      translate([20.5,12.8,tapeHeight+2*topThickness]) cylinder(h=5, r=1.5, center=false, ,$fn=30);
    }

}
